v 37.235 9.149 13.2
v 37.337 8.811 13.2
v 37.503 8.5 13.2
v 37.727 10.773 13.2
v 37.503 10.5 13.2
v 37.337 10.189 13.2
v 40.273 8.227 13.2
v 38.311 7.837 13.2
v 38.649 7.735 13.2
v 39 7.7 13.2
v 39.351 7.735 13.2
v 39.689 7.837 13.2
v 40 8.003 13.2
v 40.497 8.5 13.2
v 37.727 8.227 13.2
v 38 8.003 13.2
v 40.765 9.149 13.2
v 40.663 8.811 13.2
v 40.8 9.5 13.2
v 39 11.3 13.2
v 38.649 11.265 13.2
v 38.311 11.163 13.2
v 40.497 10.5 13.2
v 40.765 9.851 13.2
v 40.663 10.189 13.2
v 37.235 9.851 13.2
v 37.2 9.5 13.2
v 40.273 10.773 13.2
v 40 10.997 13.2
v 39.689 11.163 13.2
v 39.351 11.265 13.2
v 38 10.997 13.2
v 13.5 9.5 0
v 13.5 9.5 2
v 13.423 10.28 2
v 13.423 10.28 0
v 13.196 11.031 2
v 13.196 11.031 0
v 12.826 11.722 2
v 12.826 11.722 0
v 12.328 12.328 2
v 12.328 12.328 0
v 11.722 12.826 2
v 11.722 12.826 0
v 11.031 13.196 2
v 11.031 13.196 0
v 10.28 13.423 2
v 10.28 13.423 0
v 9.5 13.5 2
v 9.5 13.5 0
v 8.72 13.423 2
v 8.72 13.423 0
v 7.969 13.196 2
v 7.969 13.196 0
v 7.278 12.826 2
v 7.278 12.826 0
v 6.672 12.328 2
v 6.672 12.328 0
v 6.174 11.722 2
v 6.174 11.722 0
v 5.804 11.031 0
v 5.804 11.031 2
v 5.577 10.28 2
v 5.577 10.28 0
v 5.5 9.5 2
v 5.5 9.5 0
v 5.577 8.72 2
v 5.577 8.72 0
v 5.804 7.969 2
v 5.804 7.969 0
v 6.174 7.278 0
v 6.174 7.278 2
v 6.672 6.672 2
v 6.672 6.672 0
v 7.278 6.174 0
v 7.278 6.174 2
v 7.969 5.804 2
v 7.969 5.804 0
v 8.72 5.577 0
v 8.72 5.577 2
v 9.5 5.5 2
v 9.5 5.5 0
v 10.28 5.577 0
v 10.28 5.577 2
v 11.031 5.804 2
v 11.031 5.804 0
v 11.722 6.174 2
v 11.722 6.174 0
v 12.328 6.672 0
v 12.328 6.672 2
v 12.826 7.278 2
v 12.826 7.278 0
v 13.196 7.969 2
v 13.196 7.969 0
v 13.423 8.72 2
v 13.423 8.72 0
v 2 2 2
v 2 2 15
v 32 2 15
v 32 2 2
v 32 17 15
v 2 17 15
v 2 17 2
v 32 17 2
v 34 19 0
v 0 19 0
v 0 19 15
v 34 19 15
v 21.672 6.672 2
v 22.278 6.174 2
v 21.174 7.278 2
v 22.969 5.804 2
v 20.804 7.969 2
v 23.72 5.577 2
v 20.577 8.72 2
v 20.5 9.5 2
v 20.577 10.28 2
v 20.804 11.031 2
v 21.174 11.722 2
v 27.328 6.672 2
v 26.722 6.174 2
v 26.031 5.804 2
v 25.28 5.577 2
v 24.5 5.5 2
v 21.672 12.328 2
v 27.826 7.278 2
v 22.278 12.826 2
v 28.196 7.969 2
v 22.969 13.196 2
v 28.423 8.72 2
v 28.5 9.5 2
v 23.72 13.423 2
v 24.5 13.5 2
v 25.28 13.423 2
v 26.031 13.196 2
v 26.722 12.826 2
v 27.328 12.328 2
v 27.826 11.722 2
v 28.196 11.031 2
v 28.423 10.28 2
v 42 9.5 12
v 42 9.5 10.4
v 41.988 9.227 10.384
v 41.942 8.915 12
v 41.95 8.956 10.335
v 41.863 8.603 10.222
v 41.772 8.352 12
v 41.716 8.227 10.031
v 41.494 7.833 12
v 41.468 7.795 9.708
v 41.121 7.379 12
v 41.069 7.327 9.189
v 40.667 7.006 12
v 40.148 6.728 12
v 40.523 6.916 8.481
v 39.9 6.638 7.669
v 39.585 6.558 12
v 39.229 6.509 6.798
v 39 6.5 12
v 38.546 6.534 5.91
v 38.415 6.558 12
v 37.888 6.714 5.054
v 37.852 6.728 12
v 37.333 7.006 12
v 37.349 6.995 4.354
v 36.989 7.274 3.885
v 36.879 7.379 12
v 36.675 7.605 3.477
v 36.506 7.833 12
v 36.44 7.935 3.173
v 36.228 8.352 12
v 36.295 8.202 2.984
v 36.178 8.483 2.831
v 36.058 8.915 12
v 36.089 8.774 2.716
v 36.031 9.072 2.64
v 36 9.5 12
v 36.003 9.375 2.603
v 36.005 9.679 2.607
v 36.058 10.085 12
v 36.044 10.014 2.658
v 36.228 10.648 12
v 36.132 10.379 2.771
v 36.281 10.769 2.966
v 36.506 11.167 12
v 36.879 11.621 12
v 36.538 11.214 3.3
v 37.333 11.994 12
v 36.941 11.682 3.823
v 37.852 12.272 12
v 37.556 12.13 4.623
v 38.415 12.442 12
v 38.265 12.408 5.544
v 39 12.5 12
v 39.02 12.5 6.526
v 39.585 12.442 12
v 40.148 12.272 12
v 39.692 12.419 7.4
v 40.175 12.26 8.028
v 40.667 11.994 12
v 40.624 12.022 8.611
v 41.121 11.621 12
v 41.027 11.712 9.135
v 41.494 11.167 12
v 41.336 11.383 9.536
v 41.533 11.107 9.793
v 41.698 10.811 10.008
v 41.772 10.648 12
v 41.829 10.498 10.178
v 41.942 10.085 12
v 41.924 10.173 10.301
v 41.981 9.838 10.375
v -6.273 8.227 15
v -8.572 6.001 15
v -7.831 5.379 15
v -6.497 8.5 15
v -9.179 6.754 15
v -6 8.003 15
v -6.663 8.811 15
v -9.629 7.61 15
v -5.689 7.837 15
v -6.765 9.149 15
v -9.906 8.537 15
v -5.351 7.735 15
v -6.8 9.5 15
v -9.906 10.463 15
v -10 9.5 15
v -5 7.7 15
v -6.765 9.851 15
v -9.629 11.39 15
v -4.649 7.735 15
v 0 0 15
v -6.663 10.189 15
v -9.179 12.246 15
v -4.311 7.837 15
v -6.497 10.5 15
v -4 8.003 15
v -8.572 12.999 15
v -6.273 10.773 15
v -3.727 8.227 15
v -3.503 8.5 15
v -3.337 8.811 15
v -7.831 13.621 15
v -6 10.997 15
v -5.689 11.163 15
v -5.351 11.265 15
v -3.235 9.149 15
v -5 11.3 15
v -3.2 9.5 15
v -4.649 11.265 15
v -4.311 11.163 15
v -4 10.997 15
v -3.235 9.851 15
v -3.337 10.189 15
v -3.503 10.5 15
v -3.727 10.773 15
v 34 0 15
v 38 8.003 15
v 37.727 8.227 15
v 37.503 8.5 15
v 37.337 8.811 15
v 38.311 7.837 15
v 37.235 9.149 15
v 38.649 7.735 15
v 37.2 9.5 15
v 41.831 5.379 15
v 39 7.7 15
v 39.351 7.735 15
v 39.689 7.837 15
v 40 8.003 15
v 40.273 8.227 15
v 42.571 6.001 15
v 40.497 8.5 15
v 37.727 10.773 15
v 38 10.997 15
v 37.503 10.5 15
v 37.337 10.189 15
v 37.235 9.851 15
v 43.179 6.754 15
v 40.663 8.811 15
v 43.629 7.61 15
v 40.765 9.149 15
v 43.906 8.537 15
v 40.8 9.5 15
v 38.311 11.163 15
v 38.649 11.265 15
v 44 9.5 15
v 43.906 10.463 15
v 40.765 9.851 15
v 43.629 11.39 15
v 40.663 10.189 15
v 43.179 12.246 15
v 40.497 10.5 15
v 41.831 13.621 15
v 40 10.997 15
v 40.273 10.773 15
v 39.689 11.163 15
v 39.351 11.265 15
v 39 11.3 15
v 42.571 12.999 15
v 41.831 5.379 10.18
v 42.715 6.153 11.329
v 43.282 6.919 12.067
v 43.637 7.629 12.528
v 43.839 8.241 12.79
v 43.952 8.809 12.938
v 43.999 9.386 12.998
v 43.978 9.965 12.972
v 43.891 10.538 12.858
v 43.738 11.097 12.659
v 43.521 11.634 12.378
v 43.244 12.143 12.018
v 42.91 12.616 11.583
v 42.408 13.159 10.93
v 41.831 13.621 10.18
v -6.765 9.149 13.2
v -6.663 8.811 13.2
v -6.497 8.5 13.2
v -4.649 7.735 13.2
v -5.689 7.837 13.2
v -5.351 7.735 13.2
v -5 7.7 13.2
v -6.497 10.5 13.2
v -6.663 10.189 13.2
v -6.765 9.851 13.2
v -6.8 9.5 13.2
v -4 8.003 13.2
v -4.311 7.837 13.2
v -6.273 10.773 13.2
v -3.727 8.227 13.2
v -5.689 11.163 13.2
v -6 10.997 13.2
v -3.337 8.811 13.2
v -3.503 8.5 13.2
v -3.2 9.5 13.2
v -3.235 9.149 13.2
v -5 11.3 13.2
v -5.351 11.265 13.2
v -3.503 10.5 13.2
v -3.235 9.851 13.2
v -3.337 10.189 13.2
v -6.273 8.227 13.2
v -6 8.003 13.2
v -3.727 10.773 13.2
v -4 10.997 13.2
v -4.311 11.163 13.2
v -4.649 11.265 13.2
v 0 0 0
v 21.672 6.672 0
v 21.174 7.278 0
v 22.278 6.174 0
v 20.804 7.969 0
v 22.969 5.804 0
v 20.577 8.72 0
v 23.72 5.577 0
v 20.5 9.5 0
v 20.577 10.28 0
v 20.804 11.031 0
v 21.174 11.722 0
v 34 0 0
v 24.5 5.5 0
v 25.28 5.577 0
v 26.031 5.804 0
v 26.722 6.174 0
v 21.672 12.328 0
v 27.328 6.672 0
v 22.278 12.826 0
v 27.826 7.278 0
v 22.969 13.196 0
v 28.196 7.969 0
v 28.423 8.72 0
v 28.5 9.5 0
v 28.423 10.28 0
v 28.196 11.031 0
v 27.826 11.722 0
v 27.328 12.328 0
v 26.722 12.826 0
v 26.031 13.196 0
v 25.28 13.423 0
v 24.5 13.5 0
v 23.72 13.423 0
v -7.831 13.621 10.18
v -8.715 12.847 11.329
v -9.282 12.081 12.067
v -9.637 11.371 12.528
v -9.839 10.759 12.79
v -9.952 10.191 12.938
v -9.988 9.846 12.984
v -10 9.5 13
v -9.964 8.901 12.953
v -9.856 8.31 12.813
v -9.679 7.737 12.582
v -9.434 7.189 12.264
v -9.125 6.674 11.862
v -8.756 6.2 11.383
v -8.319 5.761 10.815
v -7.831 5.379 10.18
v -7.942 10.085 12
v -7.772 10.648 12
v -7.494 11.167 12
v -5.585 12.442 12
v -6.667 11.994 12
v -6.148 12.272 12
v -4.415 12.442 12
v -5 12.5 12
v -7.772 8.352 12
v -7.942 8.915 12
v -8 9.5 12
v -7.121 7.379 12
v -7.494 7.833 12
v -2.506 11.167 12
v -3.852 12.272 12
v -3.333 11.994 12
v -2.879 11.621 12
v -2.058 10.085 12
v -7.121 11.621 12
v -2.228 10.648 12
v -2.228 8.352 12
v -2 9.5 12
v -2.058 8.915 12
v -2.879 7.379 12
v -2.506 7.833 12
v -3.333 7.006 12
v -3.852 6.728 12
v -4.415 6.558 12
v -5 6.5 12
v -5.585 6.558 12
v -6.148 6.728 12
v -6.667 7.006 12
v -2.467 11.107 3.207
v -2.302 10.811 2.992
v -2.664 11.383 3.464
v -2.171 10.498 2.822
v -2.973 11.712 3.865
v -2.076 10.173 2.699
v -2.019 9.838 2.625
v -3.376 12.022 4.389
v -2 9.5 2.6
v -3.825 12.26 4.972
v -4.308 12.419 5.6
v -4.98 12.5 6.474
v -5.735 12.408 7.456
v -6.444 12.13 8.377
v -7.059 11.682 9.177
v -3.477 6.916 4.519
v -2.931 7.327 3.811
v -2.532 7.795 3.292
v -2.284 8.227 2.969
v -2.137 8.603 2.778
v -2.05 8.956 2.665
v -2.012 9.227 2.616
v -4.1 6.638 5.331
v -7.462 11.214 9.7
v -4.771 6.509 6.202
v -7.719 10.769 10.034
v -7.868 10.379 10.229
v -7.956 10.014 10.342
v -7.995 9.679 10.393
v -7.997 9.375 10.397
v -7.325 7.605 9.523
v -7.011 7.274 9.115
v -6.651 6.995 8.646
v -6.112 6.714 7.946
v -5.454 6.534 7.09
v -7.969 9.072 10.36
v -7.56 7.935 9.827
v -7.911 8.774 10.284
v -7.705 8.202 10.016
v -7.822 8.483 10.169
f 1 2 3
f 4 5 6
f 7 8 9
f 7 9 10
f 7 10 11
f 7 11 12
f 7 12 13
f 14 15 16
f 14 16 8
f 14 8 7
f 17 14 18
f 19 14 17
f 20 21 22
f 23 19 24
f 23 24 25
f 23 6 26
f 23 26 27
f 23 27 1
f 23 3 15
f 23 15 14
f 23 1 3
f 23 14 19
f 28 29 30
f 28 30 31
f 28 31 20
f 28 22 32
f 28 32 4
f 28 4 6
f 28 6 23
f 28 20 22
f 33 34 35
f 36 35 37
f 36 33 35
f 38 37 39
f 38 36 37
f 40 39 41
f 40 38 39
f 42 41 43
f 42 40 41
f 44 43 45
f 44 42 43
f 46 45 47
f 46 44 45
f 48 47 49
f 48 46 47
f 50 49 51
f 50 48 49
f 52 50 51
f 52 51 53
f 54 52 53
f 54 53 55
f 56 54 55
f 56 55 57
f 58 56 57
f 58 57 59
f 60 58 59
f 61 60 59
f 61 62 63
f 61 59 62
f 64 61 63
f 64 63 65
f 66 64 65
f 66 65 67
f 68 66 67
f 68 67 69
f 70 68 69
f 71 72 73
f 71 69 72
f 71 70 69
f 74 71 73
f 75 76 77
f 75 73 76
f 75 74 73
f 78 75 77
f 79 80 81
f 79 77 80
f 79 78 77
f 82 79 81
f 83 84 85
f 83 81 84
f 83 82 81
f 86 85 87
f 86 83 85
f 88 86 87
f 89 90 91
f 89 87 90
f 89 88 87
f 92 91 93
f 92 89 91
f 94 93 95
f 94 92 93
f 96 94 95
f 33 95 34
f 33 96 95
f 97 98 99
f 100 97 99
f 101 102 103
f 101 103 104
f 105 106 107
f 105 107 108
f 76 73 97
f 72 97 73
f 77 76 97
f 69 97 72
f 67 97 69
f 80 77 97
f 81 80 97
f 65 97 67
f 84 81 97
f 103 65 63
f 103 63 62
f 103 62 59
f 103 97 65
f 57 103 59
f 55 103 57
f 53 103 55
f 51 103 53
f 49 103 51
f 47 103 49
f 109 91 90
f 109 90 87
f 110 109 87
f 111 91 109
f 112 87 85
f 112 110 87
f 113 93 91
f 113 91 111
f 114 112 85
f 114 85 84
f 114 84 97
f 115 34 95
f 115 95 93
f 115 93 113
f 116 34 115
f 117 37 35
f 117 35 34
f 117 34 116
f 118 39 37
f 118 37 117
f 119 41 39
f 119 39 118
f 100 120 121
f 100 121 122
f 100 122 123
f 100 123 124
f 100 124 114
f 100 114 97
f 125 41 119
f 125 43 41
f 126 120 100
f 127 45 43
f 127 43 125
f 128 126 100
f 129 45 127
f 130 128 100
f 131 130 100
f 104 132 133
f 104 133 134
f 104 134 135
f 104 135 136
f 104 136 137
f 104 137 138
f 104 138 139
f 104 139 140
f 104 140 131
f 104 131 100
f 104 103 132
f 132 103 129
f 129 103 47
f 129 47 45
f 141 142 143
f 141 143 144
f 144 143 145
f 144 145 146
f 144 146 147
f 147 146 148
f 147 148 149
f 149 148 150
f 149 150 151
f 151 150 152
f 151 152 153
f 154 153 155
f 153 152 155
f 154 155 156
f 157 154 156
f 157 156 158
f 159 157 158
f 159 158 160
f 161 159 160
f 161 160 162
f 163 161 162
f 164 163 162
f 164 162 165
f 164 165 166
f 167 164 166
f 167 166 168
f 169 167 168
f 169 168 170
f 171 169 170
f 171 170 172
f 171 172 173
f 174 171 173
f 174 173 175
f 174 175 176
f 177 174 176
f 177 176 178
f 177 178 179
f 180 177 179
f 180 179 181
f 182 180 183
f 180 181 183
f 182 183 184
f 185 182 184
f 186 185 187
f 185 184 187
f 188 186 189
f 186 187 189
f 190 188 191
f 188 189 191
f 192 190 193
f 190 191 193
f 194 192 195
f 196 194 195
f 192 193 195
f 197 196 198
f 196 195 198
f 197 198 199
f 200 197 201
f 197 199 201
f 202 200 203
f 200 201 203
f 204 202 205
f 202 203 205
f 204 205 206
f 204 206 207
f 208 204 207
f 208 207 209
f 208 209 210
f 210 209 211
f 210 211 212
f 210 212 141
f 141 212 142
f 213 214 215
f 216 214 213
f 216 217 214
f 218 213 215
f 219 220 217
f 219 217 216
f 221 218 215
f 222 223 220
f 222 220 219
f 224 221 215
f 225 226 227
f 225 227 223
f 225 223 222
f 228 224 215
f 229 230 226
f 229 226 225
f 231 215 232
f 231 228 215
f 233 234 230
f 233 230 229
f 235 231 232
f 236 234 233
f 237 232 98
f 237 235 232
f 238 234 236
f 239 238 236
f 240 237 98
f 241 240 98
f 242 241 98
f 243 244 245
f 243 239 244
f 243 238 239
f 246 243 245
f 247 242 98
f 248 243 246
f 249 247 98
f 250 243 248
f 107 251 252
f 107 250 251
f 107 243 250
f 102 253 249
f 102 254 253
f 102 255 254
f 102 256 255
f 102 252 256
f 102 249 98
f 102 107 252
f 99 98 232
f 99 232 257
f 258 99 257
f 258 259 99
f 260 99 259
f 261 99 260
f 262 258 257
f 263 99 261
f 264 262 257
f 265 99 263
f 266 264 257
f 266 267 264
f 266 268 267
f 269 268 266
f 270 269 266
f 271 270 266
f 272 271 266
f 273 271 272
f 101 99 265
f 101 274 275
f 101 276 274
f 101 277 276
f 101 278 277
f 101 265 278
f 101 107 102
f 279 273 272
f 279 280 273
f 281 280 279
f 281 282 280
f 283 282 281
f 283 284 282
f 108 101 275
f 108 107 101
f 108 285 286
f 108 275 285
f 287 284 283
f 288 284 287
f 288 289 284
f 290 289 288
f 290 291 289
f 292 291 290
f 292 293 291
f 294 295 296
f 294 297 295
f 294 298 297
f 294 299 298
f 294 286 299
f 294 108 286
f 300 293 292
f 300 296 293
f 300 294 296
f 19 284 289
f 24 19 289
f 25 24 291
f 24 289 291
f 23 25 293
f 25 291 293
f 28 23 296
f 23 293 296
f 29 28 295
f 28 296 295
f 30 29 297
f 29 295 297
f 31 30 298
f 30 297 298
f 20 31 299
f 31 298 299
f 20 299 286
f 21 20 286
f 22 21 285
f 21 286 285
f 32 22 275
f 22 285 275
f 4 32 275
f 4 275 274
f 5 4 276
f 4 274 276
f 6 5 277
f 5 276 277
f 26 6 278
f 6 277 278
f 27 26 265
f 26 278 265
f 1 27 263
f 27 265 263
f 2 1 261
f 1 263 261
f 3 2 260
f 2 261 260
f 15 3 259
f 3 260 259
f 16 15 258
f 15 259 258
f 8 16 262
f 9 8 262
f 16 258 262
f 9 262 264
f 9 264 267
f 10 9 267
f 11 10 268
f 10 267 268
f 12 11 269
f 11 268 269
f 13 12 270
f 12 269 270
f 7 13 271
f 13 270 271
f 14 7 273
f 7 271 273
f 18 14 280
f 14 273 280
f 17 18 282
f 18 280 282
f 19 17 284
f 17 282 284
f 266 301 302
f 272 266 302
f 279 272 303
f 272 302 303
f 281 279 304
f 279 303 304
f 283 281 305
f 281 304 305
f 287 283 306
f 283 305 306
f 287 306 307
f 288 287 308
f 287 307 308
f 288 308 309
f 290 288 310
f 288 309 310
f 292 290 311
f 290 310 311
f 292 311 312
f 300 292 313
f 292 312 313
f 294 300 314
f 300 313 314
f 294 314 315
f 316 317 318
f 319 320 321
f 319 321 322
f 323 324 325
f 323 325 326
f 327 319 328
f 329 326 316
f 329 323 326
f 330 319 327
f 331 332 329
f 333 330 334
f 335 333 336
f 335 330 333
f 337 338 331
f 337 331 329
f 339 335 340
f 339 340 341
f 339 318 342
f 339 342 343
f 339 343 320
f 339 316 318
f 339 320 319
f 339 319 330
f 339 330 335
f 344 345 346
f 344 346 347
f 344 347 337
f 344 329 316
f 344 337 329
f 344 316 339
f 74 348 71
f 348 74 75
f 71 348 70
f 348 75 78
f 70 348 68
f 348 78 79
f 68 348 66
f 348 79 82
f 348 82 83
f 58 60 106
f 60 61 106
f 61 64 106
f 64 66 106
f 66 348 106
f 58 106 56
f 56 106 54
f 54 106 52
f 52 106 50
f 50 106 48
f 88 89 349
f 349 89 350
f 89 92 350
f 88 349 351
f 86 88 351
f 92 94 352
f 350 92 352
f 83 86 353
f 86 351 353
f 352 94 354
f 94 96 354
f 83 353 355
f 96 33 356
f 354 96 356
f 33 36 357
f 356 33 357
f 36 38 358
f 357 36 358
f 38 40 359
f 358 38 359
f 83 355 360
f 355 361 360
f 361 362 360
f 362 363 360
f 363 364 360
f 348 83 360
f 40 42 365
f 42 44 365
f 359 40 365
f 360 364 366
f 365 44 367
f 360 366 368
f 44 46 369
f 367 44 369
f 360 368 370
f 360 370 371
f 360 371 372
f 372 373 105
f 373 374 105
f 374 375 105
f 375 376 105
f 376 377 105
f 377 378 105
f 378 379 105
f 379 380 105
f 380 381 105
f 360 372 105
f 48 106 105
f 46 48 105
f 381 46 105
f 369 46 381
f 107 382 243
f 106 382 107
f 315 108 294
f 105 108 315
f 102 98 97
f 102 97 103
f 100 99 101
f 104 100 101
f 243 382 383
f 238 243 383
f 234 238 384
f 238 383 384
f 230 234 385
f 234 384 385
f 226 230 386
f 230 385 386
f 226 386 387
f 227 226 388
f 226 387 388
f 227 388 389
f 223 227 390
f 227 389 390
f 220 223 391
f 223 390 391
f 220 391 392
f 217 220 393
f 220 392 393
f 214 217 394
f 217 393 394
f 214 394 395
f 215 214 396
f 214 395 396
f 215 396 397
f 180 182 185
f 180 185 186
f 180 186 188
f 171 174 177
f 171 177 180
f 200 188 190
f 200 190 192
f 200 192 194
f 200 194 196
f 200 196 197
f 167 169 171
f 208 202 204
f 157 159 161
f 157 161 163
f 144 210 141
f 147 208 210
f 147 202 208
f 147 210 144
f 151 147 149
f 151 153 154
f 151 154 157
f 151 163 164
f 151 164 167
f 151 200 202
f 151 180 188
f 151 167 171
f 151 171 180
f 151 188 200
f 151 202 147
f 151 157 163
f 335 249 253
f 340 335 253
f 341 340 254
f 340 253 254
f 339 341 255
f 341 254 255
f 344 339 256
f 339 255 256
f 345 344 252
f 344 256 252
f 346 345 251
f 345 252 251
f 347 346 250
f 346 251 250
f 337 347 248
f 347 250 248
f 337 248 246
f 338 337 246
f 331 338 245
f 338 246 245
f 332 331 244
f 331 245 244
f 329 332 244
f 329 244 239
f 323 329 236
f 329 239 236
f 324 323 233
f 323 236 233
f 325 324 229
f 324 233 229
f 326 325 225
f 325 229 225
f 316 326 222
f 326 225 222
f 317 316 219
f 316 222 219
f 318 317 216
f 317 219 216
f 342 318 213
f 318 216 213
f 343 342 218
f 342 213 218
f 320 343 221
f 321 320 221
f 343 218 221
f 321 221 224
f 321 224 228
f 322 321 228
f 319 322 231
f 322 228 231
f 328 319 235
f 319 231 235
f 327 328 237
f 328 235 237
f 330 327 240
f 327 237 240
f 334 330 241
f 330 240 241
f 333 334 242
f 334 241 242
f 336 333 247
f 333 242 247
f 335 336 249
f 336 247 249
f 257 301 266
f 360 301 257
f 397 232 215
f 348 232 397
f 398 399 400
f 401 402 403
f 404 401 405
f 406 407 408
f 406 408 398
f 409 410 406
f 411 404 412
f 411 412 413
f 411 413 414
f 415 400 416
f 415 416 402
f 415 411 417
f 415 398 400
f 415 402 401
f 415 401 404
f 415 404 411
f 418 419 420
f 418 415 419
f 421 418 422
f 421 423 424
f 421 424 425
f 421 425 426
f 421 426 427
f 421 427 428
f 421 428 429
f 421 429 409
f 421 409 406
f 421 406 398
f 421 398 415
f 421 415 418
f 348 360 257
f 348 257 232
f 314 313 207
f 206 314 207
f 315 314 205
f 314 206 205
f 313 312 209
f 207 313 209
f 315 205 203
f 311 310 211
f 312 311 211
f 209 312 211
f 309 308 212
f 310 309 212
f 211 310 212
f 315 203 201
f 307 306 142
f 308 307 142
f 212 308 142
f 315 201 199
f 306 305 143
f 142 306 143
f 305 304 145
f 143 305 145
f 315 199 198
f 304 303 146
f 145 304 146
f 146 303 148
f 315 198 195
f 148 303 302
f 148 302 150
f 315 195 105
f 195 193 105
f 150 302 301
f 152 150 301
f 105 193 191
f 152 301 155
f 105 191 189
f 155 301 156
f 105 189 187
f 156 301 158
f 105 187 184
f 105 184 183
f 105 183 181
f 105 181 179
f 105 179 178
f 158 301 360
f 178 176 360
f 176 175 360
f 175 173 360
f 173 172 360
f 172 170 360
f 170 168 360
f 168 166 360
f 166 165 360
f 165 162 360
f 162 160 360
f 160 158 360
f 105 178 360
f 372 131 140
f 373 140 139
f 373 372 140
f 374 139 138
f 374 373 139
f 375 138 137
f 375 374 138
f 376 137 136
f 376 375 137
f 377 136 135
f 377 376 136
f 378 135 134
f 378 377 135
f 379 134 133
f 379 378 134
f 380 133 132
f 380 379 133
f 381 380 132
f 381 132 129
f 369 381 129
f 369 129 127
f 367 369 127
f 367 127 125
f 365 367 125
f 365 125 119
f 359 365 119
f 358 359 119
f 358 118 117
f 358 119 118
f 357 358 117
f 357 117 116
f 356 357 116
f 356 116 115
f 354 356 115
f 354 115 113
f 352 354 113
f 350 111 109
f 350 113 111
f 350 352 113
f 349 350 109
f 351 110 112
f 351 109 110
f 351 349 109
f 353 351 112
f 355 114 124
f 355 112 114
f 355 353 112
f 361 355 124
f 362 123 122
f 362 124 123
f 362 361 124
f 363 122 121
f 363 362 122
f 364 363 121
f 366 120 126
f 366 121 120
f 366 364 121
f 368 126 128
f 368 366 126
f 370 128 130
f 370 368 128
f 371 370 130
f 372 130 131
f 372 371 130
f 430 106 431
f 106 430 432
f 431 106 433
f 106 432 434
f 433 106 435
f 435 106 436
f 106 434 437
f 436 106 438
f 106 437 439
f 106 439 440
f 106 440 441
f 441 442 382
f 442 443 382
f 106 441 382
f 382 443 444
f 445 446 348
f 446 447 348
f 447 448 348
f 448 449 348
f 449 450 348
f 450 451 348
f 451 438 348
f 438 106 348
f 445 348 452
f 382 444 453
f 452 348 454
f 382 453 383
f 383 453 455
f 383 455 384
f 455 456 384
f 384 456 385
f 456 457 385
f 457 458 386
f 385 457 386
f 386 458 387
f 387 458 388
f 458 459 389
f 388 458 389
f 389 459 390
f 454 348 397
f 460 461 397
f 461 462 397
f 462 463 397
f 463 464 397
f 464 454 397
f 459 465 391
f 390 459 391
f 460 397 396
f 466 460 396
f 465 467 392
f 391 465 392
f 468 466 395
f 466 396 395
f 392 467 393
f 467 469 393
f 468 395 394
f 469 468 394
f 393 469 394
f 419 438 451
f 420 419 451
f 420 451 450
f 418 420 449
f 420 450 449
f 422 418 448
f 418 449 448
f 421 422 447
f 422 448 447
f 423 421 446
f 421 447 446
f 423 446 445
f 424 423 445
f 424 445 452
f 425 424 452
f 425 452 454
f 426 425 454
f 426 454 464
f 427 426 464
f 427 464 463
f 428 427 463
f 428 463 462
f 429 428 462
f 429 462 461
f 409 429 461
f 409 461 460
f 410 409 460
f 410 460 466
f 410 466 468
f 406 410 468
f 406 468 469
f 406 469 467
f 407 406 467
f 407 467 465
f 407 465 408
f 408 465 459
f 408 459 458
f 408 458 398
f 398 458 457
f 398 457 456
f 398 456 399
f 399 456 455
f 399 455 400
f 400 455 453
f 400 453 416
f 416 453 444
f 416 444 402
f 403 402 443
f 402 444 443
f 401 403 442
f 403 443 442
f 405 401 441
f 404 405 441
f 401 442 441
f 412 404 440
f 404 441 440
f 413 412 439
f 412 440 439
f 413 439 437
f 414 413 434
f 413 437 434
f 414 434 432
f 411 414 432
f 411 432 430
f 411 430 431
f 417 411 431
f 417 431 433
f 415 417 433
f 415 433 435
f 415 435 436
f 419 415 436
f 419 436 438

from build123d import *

# Parameters (mm, degrees)
SKETCH_R        = 4
PAD_DEPTH       = 15
SKETCH001_R     = 3
POCKET_DEPTH    = 12
SKETCH002_R     = 1.8
POCKET001_DEPTH = 1.8
SKETCH003_W     = 30
SKETCH003_H     = 15
POCKET002_DEPTH = 13
POCKET004_DEPTH = 19


with BuildPart() as part:
    # Sketch → Pad (new body)
    with BuildSketch(Plane.XY):
        with BuildLine():
            ThreePointArc((-7.83079, 13.621483), (-10, 9.5), (-7.83079, 5.378516))
            Line((0, 0), (-7.83079, 5.378516))
            Line((34, 0), (0, 0))
            Line((41.830773, 5.378541), (34, 0))
            ThreePointArc((41.830773, 5.378541), (43.999947, 9.5), (41.830774, 13.621459))
            Line((34, 19), (41.830774, 13.621459))
            Line((0, 19), (34, 19))
            Line((-7.83079, 13.621483), (0, 19))
        make_face()
        with Locations((9.5, 9.5)):
            Circle(SKETCH_R, mode=Mode.SUBTRACT)
        with Locations((24.5, 9.5)):
            Circle(SKETCH_R, mode=Mode.SUBTRACT)
    extrude(amount=PAD_DEPTH)

    # Sketch001 → Pocket (cut)
    with BuildSketch(Plane(origin=(0, 0, 0), x_dir=(1, 0, 0), z_dir=(0, 0, -1))):
        with Locations((-5, -9.5)):
            Circle(SKETCH001_R)
        with Locations((39, -9.5)):
            Circle(SKETCH001_R)
    extrude(amount=-POCKET_DEPTH, mode=Mode.SUBTRACT)

    # Sketch002 → Pocket001 (cut)
    with BuildSketch(Plane.XY.offset(15)):
        with Locations((-5, 9.5)):
            Circle(SKETCH002_R)
        with Locations((39, 9.5)):
            Circle(SKETCH002_R)
    extrude(amount=-POCKET001_DEPTH, mode=Mode.SUBTRACT)

    # Sketch003 → Pocket002 (cut)
    with BuildSketch(Plane.XY.offset(15)):
        with Locations((17, 9.5)):
            Rectangle(SKETCH003_W, SKETCH003_H)
    extrude(amount=-POCKET002_DEPTH, mode=Mode.SUBTRACT)

    # Sketch004 → Pocket004 (cut)
    with BuildSketch(Plane.XZ):
        Polygon((-11, 13), (-11, -2), (45, -2), (45, 13), (44, 13), (34, 0), (0, 0), (-10, 13), align=None)
    extrude(amount=-POCKET004_DEPTH, mode=Mode.SUBTRACT)


solid = part.part
